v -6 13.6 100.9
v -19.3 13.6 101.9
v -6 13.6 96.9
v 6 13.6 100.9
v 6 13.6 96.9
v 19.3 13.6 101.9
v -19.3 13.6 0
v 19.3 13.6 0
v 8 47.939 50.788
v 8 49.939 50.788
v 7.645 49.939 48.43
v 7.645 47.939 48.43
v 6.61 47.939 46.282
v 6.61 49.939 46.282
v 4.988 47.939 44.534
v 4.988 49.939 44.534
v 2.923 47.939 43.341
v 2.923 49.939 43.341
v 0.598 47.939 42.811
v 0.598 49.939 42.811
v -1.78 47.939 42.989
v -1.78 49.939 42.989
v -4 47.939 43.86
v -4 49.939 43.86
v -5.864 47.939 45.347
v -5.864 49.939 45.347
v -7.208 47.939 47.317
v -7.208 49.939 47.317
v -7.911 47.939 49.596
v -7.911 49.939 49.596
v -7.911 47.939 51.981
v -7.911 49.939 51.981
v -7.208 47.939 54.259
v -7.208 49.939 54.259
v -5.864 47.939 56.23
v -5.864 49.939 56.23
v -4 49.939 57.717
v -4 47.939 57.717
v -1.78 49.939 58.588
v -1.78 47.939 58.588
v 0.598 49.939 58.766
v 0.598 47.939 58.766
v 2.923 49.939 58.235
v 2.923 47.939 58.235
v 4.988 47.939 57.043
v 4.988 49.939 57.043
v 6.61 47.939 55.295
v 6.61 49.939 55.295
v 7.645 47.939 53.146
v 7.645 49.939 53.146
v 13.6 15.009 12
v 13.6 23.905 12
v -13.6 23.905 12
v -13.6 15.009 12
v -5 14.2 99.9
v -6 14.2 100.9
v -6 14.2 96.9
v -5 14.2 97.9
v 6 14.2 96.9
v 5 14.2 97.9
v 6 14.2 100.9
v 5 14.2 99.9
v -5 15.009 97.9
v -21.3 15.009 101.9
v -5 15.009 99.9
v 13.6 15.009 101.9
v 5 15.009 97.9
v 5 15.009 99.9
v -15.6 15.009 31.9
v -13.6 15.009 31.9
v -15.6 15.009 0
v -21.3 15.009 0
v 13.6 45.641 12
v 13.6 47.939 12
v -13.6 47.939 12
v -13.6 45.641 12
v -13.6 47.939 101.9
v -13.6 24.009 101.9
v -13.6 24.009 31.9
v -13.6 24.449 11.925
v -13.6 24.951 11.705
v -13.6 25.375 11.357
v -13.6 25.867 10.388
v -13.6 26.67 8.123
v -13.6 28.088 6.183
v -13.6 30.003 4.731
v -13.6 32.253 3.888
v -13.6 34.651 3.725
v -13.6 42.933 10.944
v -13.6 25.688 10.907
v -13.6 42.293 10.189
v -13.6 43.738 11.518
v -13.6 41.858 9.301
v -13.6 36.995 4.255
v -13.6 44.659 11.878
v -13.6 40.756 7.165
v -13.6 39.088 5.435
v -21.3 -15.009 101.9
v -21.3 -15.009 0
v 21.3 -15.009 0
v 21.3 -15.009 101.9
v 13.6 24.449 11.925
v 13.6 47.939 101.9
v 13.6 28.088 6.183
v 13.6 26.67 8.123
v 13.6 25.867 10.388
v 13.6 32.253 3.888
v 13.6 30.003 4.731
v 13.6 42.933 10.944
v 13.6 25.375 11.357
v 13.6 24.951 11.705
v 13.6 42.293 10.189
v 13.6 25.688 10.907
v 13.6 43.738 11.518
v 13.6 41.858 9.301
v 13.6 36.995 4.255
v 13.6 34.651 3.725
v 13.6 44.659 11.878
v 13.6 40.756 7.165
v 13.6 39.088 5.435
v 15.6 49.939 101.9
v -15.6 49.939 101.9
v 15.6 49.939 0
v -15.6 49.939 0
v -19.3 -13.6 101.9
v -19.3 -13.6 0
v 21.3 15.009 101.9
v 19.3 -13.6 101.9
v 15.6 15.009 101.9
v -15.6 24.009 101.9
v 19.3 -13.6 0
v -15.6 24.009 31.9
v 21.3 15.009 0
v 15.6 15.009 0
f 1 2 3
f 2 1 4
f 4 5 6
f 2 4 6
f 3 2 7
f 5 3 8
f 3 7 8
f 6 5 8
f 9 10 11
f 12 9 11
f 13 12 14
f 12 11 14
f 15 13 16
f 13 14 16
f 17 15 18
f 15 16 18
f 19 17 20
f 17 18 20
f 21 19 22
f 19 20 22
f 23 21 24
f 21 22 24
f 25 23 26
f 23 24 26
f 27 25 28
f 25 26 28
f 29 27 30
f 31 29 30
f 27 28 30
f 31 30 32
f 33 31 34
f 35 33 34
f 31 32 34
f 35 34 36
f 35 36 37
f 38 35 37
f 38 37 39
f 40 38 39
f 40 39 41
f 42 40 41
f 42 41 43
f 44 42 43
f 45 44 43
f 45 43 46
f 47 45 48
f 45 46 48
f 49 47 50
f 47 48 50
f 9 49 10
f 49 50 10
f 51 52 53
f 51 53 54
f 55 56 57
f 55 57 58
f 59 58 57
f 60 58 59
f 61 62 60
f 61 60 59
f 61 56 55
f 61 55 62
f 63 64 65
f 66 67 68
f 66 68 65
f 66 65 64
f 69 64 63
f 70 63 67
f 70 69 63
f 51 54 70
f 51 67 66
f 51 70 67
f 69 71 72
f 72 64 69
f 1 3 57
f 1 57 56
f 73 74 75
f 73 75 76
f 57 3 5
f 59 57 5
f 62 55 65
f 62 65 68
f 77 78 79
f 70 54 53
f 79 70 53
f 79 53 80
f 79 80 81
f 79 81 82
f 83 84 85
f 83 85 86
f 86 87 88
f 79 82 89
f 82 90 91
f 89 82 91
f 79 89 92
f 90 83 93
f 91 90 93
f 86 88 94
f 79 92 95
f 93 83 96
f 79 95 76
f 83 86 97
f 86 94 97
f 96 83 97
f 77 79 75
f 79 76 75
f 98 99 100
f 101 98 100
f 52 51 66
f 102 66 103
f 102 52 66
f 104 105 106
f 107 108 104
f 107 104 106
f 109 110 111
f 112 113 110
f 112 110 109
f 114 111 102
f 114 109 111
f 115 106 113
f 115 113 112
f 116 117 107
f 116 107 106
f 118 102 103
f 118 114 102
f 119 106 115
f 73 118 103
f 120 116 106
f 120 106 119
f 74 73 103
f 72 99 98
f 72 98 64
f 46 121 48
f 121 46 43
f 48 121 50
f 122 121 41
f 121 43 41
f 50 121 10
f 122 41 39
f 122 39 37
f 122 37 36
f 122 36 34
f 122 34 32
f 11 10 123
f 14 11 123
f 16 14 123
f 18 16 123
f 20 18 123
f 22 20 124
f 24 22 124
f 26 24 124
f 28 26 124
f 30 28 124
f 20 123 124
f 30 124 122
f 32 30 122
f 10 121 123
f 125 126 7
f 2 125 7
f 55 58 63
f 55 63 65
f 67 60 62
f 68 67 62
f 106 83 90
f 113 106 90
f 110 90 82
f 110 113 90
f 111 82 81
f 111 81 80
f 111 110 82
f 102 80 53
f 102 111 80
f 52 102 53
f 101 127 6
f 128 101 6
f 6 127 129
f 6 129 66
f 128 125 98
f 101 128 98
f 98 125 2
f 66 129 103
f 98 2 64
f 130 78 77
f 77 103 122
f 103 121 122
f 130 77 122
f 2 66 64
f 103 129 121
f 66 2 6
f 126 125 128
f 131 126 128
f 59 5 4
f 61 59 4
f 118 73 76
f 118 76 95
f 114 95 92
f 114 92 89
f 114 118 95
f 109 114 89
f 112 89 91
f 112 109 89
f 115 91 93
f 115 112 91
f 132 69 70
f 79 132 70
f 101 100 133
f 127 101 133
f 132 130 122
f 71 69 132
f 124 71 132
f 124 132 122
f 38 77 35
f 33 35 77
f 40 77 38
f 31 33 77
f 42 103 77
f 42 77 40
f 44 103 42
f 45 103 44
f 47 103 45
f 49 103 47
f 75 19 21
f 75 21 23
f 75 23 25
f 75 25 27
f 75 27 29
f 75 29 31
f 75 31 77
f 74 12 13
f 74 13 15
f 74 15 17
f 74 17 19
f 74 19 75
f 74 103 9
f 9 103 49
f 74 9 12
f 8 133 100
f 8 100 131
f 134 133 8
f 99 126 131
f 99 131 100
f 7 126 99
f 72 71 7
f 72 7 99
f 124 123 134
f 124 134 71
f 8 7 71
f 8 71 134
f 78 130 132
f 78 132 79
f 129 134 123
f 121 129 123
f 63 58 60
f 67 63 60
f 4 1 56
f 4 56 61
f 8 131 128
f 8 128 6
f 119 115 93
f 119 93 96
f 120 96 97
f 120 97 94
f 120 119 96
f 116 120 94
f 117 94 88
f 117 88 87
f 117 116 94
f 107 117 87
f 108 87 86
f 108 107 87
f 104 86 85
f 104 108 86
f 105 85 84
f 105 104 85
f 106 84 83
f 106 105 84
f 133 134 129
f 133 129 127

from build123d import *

# Parameters (mm, degrees)
SKETCH1_W                = 42.6
SKETCH1_H                = 30.01865285
SKETCH1_W_2              = 38.6
SKETCH1_H_2              = 27.2
BOSS_EXTRUDE1_DEPTH      = 101.9
BOSS_EXTRUDE2_DEPTH      = 13.6
BOSS_EXTRUDE2_DEPTH_BACK = 13.6
SKETCH4_W                = 2
SKETCH4_H                = 34.93
BOSS_EXTRUDE3_DEPTH      = 101.9
SKETCH5_R                = 8
CUT_EXTRUDE1_DEPTH       = 2
CUT_EXTRUDE2_REACH       = 38.339
SKETCH6_W                = 10
SKETCH6_H                = 2
SKETCH7_W                = 12
SKETCH7_H                = 4
SKETCH7_W_2              = 10
SKETCH7_H_2              = 2
CUT_EXTRUDE3_DEPTH       = 0.6
SKETCH8_W                = 2
SKETCH8_H                = 9
CUT_EXTRUDE4_DEPTH       = 70


with BuildPart() as part:
    # Sketch1 → Boss-Extrude1 (new body)
    with BuildSketch(Plane.XY):
        Rectangle(SKETCH1_W, SKETCH1_H)
        Rectangle(SKETCH1_W_2, SKETCH1_H_2, mode=Mode.SUBTRACT)
    extrude(amount=BOSS_EXTRUDE1_DEPTH)

    # Sketch3 → Boss-Extrude2 (add, two sides)
    with BuildSketch(Plane(origin=(0, 0, 0), x_dir=(0, 0, -1), z_dir=(1, 0, 0))) as boss_extrude2_sk:
        with BuildLine():
            Line((-12, 15.009326425), (0, 15.009326425))
            Line((0, 15.009326425), (0, 49.939326425))
            Line((0, 49.939326425), (-101.9, 49.939326425))
            Line((-101.9, 49.939326425), (-101.9, 47.939326425))
            Line((-101.9, 47.939326425), (-12, 47.939326425))
            Line((-12, 47.939326425), (-12, 45.640749382))
            ThreePointArc((-12, 45.640749382), (-11.256013823, 43.317309263), (-9.300813008, 41.85817281))
            ThreePointArc((-9.300813008, 41.85817281), (-3.719128817, 33.446145776), (-10.388349515, 25.867300712))
            ThreePointArc((-10.388349515, 25.867300712), (-11.545428586, 25.174874775), (-12, 23.905366805))
            Line((-12, 23.905366805), (-12, 15.009326425))
        make_face()
    extrude(amount=BOSS_EXTRUDE2_DEPTH)
    extrude(boss_extrude2_sk.sketch, amount=-BOSS_EXTRUDE2_DEPTH_BACK)

    # Sketch4 → Boss-Extrude3 (add)
    with BuildSketch(Plane(origin=(0, 0, 0), x_dir=(-1, 0, 0), z_dir=(0, 0, -1))):
        with Locations((14.6, 32.474326425)):
            Rectangle(SKETCH4_W, SKETCH4_H)
        with Locations((-14.6, 32.474326425)):
            Rectangle(SKETCH4_W, SKETCH4_H)
    extrude(amount=-BOSS_EXTRUDE3_DEPTH)

    # Sketch5 → Cut-Extrude1 (cut)
    with BuildSketch(Plane(origin=(0, 49.939326425, 0), x_dir=(1, 0, 0), z_dir=(0, 1, 0))):
        with Locations((0, -50.788349515)):
            Circle(SKETCH5_R)
    extrude(amount=-CUT_EXTRUDE1_DEPTH, mode=Mode.SUBTRACT)

    # Sketch6 → Cut-Extrude2 (cut, up to next)
    with BuildSketch(Plane.XZ.offset(-13.6), mode=Mode.PRIVATE) as cut_extrude2_sk1:
        with Locations((0, 98.9)):
            Rectangle(SKETCH6_W, SKETCH6_H)
    cut_extrude2_tool1 = extrude(cut_extrude2_sk1.sketch, amount=-CUT_EXTRUDE2_REACH, mode=Mode.PRIVATE) & part.part
    add(cut_extrude2_tool1.solids().sort_by_distance((0, 13.6, 98.9))[0], mode=Mode.SUBTRACT)

    # Sketch7 → Cut-Extrude3 (cut)
    with BuildSketch(Plane.XZ.offset(-13.6)):
        with Locations((0, 98.9)):
            Rectangle(SKETCH7_W, SKETCH7_H)
        with Locations((0, 98.9)):
            Rectangle(SKETCH7_W_2, SKETCH7_H_2, mode=Mode.SUBTRACT)
    extrude(amount=-CUT_EXTRUDE3_DEPTH, mode=Mode.SUBTRACT)

    # Sketch8 → Cut-Extrude4 (cut)
    with BuildSketch(Plane.XY.offset(101.9)):
        with Locations((-14.6, 19.509326425)):
            Rectangle(SKETCH8_W, SKETCH8_H)
    extrude(amount=-CUT_EXTRUDE4_DEPTH, mode=Mode.SUBTRACT)


solid = part.part
